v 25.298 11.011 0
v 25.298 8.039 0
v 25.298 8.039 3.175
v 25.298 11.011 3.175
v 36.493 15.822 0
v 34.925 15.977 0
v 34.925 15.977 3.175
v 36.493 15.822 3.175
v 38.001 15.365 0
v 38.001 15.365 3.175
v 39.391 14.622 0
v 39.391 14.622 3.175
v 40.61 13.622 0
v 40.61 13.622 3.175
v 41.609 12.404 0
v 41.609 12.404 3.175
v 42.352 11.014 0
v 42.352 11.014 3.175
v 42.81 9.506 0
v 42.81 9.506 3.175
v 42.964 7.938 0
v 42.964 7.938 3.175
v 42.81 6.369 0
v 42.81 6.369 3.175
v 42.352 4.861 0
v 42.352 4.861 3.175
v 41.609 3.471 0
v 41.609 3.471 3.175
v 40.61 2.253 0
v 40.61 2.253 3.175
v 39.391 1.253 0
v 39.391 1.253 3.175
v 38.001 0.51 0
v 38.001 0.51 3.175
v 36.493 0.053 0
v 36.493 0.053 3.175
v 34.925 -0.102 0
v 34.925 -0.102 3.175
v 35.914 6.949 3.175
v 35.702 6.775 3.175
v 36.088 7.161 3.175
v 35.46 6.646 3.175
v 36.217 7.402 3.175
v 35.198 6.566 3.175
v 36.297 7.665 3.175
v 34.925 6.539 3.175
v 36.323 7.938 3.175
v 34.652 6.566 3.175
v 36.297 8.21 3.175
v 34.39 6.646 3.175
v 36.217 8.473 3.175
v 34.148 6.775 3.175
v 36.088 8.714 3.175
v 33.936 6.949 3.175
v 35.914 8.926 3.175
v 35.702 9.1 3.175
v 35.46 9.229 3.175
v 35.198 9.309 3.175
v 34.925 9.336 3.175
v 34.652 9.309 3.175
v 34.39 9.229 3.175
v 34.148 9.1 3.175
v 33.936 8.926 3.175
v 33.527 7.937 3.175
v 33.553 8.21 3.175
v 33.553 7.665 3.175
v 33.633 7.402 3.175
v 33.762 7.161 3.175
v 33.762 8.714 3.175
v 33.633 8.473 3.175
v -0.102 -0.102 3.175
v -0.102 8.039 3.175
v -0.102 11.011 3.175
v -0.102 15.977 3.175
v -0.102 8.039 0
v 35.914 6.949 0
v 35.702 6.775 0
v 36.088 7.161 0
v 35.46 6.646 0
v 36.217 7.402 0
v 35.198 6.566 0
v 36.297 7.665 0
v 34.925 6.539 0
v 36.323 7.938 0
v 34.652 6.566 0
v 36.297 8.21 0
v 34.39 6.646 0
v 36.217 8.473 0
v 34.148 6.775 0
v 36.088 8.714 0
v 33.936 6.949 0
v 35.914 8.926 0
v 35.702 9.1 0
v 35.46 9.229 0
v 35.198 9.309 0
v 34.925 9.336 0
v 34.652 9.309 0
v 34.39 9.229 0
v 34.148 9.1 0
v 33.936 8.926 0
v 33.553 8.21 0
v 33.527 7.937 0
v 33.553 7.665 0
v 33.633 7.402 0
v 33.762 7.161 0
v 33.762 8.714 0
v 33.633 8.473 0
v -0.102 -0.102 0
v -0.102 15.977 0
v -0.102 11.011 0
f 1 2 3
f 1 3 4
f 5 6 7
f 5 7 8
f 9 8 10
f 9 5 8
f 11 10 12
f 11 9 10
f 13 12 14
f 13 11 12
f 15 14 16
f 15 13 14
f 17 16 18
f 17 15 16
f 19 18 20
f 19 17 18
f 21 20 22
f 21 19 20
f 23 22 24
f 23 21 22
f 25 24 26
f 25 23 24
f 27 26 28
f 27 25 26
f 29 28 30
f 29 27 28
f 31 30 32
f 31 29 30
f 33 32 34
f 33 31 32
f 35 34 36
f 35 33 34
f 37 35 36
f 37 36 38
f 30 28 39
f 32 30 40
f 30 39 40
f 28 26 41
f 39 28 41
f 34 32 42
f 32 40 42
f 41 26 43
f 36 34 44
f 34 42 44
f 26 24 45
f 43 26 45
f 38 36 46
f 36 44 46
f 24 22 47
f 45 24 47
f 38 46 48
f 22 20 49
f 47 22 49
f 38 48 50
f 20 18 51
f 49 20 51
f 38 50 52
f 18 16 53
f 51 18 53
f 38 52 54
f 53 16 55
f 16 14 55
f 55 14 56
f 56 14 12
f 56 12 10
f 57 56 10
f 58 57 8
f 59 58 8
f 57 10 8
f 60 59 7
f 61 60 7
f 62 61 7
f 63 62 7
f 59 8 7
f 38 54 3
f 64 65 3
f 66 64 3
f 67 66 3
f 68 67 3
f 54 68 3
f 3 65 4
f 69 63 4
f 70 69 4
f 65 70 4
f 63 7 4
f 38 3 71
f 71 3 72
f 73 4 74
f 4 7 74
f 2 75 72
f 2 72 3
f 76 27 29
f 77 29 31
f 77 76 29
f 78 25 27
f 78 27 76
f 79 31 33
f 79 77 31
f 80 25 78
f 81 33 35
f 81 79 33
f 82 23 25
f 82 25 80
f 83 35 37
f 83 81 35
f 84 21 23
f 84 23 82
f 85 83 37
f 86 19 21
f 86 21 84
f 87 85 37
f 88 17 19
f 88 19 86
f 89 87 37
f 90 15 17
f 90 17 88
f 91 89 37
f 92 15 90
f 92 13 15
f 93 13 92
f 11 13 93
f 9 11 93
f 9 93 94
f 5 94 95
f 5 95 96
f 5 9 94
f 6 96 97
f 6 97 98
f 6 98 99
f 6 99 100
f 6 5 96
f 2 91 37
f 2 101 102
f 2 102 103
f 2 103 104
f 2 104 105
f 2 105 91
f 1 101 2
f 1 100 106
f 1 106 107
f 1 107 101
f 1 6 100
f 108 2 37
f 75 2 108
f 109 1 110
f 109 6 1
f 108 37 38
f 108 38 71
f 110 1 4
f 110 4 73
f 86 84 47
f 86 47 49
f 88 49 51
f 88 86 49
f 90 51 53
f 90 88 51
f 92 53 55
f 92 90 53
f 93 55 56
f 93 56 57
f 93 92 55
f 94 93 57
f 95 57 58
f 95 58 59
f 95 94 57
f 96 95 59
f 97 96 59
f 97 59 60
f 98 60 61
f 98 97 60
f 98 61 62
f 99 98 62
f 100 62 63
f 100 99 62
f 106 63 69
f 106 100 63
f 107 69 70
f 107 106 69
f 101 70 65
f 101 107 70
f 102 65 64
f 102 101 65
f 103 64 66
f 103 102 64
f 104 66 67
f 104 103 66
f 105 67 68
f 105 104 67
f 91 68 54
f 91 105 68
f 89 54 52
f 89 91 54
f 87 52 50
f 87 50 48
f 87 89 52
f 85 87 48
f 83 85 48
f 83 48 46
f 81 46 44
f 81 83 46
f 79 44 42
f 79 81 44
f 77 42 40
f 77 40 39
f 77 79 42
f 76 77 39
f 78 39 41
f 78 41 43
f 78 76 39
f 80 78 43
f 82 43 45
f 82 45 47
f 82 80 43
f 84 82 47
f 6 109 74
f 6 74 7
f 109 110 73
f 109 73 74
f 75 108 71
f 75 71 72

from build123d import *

# Parameters (mm, degrees)
SKETCH1_R           = 1.3984
BOSS_EXTRUDE1_DEPTH = 3.175


with BuildPart() as part:
    # Sketch1 → Boss-Extrude1 (new body)
    with BuildSketch(Plane.XY):
        with BuildLine():
            Line((-0.1016, 15.9766), (34.925, 15.9766))
            ThreePointArc((34.925, 15.9766), (42.9641, 7.9375), (34.925, -0.1016))
            Line((34.925, -0.1016), (-0.1016, -0.1016))
            Line((-0.1016, -0.1016), (-0.1016, 4.7625))
            Line((-0.1016, 4.7625), (-0.1016, 8.0391))
            Line((-0.1016, 8.0391), (25.2984, 8.0391))
            Line((25.2984, 8.0391), (25.2984, 11.0109))
            Line((25.2984, 11.0109), (-0.1016, 11.0109))
            Line((-0.1016, 11.0109), (-0.1016, 15.9766))
        make_face()
        with Locations((34.925, 7.9375)):
            Circle(SKETCH1_R, mode=Mode.SUBTRACT)
    extrude(amount=BOSS_EXTRUDE1_DEPTH)


solid = part.part
